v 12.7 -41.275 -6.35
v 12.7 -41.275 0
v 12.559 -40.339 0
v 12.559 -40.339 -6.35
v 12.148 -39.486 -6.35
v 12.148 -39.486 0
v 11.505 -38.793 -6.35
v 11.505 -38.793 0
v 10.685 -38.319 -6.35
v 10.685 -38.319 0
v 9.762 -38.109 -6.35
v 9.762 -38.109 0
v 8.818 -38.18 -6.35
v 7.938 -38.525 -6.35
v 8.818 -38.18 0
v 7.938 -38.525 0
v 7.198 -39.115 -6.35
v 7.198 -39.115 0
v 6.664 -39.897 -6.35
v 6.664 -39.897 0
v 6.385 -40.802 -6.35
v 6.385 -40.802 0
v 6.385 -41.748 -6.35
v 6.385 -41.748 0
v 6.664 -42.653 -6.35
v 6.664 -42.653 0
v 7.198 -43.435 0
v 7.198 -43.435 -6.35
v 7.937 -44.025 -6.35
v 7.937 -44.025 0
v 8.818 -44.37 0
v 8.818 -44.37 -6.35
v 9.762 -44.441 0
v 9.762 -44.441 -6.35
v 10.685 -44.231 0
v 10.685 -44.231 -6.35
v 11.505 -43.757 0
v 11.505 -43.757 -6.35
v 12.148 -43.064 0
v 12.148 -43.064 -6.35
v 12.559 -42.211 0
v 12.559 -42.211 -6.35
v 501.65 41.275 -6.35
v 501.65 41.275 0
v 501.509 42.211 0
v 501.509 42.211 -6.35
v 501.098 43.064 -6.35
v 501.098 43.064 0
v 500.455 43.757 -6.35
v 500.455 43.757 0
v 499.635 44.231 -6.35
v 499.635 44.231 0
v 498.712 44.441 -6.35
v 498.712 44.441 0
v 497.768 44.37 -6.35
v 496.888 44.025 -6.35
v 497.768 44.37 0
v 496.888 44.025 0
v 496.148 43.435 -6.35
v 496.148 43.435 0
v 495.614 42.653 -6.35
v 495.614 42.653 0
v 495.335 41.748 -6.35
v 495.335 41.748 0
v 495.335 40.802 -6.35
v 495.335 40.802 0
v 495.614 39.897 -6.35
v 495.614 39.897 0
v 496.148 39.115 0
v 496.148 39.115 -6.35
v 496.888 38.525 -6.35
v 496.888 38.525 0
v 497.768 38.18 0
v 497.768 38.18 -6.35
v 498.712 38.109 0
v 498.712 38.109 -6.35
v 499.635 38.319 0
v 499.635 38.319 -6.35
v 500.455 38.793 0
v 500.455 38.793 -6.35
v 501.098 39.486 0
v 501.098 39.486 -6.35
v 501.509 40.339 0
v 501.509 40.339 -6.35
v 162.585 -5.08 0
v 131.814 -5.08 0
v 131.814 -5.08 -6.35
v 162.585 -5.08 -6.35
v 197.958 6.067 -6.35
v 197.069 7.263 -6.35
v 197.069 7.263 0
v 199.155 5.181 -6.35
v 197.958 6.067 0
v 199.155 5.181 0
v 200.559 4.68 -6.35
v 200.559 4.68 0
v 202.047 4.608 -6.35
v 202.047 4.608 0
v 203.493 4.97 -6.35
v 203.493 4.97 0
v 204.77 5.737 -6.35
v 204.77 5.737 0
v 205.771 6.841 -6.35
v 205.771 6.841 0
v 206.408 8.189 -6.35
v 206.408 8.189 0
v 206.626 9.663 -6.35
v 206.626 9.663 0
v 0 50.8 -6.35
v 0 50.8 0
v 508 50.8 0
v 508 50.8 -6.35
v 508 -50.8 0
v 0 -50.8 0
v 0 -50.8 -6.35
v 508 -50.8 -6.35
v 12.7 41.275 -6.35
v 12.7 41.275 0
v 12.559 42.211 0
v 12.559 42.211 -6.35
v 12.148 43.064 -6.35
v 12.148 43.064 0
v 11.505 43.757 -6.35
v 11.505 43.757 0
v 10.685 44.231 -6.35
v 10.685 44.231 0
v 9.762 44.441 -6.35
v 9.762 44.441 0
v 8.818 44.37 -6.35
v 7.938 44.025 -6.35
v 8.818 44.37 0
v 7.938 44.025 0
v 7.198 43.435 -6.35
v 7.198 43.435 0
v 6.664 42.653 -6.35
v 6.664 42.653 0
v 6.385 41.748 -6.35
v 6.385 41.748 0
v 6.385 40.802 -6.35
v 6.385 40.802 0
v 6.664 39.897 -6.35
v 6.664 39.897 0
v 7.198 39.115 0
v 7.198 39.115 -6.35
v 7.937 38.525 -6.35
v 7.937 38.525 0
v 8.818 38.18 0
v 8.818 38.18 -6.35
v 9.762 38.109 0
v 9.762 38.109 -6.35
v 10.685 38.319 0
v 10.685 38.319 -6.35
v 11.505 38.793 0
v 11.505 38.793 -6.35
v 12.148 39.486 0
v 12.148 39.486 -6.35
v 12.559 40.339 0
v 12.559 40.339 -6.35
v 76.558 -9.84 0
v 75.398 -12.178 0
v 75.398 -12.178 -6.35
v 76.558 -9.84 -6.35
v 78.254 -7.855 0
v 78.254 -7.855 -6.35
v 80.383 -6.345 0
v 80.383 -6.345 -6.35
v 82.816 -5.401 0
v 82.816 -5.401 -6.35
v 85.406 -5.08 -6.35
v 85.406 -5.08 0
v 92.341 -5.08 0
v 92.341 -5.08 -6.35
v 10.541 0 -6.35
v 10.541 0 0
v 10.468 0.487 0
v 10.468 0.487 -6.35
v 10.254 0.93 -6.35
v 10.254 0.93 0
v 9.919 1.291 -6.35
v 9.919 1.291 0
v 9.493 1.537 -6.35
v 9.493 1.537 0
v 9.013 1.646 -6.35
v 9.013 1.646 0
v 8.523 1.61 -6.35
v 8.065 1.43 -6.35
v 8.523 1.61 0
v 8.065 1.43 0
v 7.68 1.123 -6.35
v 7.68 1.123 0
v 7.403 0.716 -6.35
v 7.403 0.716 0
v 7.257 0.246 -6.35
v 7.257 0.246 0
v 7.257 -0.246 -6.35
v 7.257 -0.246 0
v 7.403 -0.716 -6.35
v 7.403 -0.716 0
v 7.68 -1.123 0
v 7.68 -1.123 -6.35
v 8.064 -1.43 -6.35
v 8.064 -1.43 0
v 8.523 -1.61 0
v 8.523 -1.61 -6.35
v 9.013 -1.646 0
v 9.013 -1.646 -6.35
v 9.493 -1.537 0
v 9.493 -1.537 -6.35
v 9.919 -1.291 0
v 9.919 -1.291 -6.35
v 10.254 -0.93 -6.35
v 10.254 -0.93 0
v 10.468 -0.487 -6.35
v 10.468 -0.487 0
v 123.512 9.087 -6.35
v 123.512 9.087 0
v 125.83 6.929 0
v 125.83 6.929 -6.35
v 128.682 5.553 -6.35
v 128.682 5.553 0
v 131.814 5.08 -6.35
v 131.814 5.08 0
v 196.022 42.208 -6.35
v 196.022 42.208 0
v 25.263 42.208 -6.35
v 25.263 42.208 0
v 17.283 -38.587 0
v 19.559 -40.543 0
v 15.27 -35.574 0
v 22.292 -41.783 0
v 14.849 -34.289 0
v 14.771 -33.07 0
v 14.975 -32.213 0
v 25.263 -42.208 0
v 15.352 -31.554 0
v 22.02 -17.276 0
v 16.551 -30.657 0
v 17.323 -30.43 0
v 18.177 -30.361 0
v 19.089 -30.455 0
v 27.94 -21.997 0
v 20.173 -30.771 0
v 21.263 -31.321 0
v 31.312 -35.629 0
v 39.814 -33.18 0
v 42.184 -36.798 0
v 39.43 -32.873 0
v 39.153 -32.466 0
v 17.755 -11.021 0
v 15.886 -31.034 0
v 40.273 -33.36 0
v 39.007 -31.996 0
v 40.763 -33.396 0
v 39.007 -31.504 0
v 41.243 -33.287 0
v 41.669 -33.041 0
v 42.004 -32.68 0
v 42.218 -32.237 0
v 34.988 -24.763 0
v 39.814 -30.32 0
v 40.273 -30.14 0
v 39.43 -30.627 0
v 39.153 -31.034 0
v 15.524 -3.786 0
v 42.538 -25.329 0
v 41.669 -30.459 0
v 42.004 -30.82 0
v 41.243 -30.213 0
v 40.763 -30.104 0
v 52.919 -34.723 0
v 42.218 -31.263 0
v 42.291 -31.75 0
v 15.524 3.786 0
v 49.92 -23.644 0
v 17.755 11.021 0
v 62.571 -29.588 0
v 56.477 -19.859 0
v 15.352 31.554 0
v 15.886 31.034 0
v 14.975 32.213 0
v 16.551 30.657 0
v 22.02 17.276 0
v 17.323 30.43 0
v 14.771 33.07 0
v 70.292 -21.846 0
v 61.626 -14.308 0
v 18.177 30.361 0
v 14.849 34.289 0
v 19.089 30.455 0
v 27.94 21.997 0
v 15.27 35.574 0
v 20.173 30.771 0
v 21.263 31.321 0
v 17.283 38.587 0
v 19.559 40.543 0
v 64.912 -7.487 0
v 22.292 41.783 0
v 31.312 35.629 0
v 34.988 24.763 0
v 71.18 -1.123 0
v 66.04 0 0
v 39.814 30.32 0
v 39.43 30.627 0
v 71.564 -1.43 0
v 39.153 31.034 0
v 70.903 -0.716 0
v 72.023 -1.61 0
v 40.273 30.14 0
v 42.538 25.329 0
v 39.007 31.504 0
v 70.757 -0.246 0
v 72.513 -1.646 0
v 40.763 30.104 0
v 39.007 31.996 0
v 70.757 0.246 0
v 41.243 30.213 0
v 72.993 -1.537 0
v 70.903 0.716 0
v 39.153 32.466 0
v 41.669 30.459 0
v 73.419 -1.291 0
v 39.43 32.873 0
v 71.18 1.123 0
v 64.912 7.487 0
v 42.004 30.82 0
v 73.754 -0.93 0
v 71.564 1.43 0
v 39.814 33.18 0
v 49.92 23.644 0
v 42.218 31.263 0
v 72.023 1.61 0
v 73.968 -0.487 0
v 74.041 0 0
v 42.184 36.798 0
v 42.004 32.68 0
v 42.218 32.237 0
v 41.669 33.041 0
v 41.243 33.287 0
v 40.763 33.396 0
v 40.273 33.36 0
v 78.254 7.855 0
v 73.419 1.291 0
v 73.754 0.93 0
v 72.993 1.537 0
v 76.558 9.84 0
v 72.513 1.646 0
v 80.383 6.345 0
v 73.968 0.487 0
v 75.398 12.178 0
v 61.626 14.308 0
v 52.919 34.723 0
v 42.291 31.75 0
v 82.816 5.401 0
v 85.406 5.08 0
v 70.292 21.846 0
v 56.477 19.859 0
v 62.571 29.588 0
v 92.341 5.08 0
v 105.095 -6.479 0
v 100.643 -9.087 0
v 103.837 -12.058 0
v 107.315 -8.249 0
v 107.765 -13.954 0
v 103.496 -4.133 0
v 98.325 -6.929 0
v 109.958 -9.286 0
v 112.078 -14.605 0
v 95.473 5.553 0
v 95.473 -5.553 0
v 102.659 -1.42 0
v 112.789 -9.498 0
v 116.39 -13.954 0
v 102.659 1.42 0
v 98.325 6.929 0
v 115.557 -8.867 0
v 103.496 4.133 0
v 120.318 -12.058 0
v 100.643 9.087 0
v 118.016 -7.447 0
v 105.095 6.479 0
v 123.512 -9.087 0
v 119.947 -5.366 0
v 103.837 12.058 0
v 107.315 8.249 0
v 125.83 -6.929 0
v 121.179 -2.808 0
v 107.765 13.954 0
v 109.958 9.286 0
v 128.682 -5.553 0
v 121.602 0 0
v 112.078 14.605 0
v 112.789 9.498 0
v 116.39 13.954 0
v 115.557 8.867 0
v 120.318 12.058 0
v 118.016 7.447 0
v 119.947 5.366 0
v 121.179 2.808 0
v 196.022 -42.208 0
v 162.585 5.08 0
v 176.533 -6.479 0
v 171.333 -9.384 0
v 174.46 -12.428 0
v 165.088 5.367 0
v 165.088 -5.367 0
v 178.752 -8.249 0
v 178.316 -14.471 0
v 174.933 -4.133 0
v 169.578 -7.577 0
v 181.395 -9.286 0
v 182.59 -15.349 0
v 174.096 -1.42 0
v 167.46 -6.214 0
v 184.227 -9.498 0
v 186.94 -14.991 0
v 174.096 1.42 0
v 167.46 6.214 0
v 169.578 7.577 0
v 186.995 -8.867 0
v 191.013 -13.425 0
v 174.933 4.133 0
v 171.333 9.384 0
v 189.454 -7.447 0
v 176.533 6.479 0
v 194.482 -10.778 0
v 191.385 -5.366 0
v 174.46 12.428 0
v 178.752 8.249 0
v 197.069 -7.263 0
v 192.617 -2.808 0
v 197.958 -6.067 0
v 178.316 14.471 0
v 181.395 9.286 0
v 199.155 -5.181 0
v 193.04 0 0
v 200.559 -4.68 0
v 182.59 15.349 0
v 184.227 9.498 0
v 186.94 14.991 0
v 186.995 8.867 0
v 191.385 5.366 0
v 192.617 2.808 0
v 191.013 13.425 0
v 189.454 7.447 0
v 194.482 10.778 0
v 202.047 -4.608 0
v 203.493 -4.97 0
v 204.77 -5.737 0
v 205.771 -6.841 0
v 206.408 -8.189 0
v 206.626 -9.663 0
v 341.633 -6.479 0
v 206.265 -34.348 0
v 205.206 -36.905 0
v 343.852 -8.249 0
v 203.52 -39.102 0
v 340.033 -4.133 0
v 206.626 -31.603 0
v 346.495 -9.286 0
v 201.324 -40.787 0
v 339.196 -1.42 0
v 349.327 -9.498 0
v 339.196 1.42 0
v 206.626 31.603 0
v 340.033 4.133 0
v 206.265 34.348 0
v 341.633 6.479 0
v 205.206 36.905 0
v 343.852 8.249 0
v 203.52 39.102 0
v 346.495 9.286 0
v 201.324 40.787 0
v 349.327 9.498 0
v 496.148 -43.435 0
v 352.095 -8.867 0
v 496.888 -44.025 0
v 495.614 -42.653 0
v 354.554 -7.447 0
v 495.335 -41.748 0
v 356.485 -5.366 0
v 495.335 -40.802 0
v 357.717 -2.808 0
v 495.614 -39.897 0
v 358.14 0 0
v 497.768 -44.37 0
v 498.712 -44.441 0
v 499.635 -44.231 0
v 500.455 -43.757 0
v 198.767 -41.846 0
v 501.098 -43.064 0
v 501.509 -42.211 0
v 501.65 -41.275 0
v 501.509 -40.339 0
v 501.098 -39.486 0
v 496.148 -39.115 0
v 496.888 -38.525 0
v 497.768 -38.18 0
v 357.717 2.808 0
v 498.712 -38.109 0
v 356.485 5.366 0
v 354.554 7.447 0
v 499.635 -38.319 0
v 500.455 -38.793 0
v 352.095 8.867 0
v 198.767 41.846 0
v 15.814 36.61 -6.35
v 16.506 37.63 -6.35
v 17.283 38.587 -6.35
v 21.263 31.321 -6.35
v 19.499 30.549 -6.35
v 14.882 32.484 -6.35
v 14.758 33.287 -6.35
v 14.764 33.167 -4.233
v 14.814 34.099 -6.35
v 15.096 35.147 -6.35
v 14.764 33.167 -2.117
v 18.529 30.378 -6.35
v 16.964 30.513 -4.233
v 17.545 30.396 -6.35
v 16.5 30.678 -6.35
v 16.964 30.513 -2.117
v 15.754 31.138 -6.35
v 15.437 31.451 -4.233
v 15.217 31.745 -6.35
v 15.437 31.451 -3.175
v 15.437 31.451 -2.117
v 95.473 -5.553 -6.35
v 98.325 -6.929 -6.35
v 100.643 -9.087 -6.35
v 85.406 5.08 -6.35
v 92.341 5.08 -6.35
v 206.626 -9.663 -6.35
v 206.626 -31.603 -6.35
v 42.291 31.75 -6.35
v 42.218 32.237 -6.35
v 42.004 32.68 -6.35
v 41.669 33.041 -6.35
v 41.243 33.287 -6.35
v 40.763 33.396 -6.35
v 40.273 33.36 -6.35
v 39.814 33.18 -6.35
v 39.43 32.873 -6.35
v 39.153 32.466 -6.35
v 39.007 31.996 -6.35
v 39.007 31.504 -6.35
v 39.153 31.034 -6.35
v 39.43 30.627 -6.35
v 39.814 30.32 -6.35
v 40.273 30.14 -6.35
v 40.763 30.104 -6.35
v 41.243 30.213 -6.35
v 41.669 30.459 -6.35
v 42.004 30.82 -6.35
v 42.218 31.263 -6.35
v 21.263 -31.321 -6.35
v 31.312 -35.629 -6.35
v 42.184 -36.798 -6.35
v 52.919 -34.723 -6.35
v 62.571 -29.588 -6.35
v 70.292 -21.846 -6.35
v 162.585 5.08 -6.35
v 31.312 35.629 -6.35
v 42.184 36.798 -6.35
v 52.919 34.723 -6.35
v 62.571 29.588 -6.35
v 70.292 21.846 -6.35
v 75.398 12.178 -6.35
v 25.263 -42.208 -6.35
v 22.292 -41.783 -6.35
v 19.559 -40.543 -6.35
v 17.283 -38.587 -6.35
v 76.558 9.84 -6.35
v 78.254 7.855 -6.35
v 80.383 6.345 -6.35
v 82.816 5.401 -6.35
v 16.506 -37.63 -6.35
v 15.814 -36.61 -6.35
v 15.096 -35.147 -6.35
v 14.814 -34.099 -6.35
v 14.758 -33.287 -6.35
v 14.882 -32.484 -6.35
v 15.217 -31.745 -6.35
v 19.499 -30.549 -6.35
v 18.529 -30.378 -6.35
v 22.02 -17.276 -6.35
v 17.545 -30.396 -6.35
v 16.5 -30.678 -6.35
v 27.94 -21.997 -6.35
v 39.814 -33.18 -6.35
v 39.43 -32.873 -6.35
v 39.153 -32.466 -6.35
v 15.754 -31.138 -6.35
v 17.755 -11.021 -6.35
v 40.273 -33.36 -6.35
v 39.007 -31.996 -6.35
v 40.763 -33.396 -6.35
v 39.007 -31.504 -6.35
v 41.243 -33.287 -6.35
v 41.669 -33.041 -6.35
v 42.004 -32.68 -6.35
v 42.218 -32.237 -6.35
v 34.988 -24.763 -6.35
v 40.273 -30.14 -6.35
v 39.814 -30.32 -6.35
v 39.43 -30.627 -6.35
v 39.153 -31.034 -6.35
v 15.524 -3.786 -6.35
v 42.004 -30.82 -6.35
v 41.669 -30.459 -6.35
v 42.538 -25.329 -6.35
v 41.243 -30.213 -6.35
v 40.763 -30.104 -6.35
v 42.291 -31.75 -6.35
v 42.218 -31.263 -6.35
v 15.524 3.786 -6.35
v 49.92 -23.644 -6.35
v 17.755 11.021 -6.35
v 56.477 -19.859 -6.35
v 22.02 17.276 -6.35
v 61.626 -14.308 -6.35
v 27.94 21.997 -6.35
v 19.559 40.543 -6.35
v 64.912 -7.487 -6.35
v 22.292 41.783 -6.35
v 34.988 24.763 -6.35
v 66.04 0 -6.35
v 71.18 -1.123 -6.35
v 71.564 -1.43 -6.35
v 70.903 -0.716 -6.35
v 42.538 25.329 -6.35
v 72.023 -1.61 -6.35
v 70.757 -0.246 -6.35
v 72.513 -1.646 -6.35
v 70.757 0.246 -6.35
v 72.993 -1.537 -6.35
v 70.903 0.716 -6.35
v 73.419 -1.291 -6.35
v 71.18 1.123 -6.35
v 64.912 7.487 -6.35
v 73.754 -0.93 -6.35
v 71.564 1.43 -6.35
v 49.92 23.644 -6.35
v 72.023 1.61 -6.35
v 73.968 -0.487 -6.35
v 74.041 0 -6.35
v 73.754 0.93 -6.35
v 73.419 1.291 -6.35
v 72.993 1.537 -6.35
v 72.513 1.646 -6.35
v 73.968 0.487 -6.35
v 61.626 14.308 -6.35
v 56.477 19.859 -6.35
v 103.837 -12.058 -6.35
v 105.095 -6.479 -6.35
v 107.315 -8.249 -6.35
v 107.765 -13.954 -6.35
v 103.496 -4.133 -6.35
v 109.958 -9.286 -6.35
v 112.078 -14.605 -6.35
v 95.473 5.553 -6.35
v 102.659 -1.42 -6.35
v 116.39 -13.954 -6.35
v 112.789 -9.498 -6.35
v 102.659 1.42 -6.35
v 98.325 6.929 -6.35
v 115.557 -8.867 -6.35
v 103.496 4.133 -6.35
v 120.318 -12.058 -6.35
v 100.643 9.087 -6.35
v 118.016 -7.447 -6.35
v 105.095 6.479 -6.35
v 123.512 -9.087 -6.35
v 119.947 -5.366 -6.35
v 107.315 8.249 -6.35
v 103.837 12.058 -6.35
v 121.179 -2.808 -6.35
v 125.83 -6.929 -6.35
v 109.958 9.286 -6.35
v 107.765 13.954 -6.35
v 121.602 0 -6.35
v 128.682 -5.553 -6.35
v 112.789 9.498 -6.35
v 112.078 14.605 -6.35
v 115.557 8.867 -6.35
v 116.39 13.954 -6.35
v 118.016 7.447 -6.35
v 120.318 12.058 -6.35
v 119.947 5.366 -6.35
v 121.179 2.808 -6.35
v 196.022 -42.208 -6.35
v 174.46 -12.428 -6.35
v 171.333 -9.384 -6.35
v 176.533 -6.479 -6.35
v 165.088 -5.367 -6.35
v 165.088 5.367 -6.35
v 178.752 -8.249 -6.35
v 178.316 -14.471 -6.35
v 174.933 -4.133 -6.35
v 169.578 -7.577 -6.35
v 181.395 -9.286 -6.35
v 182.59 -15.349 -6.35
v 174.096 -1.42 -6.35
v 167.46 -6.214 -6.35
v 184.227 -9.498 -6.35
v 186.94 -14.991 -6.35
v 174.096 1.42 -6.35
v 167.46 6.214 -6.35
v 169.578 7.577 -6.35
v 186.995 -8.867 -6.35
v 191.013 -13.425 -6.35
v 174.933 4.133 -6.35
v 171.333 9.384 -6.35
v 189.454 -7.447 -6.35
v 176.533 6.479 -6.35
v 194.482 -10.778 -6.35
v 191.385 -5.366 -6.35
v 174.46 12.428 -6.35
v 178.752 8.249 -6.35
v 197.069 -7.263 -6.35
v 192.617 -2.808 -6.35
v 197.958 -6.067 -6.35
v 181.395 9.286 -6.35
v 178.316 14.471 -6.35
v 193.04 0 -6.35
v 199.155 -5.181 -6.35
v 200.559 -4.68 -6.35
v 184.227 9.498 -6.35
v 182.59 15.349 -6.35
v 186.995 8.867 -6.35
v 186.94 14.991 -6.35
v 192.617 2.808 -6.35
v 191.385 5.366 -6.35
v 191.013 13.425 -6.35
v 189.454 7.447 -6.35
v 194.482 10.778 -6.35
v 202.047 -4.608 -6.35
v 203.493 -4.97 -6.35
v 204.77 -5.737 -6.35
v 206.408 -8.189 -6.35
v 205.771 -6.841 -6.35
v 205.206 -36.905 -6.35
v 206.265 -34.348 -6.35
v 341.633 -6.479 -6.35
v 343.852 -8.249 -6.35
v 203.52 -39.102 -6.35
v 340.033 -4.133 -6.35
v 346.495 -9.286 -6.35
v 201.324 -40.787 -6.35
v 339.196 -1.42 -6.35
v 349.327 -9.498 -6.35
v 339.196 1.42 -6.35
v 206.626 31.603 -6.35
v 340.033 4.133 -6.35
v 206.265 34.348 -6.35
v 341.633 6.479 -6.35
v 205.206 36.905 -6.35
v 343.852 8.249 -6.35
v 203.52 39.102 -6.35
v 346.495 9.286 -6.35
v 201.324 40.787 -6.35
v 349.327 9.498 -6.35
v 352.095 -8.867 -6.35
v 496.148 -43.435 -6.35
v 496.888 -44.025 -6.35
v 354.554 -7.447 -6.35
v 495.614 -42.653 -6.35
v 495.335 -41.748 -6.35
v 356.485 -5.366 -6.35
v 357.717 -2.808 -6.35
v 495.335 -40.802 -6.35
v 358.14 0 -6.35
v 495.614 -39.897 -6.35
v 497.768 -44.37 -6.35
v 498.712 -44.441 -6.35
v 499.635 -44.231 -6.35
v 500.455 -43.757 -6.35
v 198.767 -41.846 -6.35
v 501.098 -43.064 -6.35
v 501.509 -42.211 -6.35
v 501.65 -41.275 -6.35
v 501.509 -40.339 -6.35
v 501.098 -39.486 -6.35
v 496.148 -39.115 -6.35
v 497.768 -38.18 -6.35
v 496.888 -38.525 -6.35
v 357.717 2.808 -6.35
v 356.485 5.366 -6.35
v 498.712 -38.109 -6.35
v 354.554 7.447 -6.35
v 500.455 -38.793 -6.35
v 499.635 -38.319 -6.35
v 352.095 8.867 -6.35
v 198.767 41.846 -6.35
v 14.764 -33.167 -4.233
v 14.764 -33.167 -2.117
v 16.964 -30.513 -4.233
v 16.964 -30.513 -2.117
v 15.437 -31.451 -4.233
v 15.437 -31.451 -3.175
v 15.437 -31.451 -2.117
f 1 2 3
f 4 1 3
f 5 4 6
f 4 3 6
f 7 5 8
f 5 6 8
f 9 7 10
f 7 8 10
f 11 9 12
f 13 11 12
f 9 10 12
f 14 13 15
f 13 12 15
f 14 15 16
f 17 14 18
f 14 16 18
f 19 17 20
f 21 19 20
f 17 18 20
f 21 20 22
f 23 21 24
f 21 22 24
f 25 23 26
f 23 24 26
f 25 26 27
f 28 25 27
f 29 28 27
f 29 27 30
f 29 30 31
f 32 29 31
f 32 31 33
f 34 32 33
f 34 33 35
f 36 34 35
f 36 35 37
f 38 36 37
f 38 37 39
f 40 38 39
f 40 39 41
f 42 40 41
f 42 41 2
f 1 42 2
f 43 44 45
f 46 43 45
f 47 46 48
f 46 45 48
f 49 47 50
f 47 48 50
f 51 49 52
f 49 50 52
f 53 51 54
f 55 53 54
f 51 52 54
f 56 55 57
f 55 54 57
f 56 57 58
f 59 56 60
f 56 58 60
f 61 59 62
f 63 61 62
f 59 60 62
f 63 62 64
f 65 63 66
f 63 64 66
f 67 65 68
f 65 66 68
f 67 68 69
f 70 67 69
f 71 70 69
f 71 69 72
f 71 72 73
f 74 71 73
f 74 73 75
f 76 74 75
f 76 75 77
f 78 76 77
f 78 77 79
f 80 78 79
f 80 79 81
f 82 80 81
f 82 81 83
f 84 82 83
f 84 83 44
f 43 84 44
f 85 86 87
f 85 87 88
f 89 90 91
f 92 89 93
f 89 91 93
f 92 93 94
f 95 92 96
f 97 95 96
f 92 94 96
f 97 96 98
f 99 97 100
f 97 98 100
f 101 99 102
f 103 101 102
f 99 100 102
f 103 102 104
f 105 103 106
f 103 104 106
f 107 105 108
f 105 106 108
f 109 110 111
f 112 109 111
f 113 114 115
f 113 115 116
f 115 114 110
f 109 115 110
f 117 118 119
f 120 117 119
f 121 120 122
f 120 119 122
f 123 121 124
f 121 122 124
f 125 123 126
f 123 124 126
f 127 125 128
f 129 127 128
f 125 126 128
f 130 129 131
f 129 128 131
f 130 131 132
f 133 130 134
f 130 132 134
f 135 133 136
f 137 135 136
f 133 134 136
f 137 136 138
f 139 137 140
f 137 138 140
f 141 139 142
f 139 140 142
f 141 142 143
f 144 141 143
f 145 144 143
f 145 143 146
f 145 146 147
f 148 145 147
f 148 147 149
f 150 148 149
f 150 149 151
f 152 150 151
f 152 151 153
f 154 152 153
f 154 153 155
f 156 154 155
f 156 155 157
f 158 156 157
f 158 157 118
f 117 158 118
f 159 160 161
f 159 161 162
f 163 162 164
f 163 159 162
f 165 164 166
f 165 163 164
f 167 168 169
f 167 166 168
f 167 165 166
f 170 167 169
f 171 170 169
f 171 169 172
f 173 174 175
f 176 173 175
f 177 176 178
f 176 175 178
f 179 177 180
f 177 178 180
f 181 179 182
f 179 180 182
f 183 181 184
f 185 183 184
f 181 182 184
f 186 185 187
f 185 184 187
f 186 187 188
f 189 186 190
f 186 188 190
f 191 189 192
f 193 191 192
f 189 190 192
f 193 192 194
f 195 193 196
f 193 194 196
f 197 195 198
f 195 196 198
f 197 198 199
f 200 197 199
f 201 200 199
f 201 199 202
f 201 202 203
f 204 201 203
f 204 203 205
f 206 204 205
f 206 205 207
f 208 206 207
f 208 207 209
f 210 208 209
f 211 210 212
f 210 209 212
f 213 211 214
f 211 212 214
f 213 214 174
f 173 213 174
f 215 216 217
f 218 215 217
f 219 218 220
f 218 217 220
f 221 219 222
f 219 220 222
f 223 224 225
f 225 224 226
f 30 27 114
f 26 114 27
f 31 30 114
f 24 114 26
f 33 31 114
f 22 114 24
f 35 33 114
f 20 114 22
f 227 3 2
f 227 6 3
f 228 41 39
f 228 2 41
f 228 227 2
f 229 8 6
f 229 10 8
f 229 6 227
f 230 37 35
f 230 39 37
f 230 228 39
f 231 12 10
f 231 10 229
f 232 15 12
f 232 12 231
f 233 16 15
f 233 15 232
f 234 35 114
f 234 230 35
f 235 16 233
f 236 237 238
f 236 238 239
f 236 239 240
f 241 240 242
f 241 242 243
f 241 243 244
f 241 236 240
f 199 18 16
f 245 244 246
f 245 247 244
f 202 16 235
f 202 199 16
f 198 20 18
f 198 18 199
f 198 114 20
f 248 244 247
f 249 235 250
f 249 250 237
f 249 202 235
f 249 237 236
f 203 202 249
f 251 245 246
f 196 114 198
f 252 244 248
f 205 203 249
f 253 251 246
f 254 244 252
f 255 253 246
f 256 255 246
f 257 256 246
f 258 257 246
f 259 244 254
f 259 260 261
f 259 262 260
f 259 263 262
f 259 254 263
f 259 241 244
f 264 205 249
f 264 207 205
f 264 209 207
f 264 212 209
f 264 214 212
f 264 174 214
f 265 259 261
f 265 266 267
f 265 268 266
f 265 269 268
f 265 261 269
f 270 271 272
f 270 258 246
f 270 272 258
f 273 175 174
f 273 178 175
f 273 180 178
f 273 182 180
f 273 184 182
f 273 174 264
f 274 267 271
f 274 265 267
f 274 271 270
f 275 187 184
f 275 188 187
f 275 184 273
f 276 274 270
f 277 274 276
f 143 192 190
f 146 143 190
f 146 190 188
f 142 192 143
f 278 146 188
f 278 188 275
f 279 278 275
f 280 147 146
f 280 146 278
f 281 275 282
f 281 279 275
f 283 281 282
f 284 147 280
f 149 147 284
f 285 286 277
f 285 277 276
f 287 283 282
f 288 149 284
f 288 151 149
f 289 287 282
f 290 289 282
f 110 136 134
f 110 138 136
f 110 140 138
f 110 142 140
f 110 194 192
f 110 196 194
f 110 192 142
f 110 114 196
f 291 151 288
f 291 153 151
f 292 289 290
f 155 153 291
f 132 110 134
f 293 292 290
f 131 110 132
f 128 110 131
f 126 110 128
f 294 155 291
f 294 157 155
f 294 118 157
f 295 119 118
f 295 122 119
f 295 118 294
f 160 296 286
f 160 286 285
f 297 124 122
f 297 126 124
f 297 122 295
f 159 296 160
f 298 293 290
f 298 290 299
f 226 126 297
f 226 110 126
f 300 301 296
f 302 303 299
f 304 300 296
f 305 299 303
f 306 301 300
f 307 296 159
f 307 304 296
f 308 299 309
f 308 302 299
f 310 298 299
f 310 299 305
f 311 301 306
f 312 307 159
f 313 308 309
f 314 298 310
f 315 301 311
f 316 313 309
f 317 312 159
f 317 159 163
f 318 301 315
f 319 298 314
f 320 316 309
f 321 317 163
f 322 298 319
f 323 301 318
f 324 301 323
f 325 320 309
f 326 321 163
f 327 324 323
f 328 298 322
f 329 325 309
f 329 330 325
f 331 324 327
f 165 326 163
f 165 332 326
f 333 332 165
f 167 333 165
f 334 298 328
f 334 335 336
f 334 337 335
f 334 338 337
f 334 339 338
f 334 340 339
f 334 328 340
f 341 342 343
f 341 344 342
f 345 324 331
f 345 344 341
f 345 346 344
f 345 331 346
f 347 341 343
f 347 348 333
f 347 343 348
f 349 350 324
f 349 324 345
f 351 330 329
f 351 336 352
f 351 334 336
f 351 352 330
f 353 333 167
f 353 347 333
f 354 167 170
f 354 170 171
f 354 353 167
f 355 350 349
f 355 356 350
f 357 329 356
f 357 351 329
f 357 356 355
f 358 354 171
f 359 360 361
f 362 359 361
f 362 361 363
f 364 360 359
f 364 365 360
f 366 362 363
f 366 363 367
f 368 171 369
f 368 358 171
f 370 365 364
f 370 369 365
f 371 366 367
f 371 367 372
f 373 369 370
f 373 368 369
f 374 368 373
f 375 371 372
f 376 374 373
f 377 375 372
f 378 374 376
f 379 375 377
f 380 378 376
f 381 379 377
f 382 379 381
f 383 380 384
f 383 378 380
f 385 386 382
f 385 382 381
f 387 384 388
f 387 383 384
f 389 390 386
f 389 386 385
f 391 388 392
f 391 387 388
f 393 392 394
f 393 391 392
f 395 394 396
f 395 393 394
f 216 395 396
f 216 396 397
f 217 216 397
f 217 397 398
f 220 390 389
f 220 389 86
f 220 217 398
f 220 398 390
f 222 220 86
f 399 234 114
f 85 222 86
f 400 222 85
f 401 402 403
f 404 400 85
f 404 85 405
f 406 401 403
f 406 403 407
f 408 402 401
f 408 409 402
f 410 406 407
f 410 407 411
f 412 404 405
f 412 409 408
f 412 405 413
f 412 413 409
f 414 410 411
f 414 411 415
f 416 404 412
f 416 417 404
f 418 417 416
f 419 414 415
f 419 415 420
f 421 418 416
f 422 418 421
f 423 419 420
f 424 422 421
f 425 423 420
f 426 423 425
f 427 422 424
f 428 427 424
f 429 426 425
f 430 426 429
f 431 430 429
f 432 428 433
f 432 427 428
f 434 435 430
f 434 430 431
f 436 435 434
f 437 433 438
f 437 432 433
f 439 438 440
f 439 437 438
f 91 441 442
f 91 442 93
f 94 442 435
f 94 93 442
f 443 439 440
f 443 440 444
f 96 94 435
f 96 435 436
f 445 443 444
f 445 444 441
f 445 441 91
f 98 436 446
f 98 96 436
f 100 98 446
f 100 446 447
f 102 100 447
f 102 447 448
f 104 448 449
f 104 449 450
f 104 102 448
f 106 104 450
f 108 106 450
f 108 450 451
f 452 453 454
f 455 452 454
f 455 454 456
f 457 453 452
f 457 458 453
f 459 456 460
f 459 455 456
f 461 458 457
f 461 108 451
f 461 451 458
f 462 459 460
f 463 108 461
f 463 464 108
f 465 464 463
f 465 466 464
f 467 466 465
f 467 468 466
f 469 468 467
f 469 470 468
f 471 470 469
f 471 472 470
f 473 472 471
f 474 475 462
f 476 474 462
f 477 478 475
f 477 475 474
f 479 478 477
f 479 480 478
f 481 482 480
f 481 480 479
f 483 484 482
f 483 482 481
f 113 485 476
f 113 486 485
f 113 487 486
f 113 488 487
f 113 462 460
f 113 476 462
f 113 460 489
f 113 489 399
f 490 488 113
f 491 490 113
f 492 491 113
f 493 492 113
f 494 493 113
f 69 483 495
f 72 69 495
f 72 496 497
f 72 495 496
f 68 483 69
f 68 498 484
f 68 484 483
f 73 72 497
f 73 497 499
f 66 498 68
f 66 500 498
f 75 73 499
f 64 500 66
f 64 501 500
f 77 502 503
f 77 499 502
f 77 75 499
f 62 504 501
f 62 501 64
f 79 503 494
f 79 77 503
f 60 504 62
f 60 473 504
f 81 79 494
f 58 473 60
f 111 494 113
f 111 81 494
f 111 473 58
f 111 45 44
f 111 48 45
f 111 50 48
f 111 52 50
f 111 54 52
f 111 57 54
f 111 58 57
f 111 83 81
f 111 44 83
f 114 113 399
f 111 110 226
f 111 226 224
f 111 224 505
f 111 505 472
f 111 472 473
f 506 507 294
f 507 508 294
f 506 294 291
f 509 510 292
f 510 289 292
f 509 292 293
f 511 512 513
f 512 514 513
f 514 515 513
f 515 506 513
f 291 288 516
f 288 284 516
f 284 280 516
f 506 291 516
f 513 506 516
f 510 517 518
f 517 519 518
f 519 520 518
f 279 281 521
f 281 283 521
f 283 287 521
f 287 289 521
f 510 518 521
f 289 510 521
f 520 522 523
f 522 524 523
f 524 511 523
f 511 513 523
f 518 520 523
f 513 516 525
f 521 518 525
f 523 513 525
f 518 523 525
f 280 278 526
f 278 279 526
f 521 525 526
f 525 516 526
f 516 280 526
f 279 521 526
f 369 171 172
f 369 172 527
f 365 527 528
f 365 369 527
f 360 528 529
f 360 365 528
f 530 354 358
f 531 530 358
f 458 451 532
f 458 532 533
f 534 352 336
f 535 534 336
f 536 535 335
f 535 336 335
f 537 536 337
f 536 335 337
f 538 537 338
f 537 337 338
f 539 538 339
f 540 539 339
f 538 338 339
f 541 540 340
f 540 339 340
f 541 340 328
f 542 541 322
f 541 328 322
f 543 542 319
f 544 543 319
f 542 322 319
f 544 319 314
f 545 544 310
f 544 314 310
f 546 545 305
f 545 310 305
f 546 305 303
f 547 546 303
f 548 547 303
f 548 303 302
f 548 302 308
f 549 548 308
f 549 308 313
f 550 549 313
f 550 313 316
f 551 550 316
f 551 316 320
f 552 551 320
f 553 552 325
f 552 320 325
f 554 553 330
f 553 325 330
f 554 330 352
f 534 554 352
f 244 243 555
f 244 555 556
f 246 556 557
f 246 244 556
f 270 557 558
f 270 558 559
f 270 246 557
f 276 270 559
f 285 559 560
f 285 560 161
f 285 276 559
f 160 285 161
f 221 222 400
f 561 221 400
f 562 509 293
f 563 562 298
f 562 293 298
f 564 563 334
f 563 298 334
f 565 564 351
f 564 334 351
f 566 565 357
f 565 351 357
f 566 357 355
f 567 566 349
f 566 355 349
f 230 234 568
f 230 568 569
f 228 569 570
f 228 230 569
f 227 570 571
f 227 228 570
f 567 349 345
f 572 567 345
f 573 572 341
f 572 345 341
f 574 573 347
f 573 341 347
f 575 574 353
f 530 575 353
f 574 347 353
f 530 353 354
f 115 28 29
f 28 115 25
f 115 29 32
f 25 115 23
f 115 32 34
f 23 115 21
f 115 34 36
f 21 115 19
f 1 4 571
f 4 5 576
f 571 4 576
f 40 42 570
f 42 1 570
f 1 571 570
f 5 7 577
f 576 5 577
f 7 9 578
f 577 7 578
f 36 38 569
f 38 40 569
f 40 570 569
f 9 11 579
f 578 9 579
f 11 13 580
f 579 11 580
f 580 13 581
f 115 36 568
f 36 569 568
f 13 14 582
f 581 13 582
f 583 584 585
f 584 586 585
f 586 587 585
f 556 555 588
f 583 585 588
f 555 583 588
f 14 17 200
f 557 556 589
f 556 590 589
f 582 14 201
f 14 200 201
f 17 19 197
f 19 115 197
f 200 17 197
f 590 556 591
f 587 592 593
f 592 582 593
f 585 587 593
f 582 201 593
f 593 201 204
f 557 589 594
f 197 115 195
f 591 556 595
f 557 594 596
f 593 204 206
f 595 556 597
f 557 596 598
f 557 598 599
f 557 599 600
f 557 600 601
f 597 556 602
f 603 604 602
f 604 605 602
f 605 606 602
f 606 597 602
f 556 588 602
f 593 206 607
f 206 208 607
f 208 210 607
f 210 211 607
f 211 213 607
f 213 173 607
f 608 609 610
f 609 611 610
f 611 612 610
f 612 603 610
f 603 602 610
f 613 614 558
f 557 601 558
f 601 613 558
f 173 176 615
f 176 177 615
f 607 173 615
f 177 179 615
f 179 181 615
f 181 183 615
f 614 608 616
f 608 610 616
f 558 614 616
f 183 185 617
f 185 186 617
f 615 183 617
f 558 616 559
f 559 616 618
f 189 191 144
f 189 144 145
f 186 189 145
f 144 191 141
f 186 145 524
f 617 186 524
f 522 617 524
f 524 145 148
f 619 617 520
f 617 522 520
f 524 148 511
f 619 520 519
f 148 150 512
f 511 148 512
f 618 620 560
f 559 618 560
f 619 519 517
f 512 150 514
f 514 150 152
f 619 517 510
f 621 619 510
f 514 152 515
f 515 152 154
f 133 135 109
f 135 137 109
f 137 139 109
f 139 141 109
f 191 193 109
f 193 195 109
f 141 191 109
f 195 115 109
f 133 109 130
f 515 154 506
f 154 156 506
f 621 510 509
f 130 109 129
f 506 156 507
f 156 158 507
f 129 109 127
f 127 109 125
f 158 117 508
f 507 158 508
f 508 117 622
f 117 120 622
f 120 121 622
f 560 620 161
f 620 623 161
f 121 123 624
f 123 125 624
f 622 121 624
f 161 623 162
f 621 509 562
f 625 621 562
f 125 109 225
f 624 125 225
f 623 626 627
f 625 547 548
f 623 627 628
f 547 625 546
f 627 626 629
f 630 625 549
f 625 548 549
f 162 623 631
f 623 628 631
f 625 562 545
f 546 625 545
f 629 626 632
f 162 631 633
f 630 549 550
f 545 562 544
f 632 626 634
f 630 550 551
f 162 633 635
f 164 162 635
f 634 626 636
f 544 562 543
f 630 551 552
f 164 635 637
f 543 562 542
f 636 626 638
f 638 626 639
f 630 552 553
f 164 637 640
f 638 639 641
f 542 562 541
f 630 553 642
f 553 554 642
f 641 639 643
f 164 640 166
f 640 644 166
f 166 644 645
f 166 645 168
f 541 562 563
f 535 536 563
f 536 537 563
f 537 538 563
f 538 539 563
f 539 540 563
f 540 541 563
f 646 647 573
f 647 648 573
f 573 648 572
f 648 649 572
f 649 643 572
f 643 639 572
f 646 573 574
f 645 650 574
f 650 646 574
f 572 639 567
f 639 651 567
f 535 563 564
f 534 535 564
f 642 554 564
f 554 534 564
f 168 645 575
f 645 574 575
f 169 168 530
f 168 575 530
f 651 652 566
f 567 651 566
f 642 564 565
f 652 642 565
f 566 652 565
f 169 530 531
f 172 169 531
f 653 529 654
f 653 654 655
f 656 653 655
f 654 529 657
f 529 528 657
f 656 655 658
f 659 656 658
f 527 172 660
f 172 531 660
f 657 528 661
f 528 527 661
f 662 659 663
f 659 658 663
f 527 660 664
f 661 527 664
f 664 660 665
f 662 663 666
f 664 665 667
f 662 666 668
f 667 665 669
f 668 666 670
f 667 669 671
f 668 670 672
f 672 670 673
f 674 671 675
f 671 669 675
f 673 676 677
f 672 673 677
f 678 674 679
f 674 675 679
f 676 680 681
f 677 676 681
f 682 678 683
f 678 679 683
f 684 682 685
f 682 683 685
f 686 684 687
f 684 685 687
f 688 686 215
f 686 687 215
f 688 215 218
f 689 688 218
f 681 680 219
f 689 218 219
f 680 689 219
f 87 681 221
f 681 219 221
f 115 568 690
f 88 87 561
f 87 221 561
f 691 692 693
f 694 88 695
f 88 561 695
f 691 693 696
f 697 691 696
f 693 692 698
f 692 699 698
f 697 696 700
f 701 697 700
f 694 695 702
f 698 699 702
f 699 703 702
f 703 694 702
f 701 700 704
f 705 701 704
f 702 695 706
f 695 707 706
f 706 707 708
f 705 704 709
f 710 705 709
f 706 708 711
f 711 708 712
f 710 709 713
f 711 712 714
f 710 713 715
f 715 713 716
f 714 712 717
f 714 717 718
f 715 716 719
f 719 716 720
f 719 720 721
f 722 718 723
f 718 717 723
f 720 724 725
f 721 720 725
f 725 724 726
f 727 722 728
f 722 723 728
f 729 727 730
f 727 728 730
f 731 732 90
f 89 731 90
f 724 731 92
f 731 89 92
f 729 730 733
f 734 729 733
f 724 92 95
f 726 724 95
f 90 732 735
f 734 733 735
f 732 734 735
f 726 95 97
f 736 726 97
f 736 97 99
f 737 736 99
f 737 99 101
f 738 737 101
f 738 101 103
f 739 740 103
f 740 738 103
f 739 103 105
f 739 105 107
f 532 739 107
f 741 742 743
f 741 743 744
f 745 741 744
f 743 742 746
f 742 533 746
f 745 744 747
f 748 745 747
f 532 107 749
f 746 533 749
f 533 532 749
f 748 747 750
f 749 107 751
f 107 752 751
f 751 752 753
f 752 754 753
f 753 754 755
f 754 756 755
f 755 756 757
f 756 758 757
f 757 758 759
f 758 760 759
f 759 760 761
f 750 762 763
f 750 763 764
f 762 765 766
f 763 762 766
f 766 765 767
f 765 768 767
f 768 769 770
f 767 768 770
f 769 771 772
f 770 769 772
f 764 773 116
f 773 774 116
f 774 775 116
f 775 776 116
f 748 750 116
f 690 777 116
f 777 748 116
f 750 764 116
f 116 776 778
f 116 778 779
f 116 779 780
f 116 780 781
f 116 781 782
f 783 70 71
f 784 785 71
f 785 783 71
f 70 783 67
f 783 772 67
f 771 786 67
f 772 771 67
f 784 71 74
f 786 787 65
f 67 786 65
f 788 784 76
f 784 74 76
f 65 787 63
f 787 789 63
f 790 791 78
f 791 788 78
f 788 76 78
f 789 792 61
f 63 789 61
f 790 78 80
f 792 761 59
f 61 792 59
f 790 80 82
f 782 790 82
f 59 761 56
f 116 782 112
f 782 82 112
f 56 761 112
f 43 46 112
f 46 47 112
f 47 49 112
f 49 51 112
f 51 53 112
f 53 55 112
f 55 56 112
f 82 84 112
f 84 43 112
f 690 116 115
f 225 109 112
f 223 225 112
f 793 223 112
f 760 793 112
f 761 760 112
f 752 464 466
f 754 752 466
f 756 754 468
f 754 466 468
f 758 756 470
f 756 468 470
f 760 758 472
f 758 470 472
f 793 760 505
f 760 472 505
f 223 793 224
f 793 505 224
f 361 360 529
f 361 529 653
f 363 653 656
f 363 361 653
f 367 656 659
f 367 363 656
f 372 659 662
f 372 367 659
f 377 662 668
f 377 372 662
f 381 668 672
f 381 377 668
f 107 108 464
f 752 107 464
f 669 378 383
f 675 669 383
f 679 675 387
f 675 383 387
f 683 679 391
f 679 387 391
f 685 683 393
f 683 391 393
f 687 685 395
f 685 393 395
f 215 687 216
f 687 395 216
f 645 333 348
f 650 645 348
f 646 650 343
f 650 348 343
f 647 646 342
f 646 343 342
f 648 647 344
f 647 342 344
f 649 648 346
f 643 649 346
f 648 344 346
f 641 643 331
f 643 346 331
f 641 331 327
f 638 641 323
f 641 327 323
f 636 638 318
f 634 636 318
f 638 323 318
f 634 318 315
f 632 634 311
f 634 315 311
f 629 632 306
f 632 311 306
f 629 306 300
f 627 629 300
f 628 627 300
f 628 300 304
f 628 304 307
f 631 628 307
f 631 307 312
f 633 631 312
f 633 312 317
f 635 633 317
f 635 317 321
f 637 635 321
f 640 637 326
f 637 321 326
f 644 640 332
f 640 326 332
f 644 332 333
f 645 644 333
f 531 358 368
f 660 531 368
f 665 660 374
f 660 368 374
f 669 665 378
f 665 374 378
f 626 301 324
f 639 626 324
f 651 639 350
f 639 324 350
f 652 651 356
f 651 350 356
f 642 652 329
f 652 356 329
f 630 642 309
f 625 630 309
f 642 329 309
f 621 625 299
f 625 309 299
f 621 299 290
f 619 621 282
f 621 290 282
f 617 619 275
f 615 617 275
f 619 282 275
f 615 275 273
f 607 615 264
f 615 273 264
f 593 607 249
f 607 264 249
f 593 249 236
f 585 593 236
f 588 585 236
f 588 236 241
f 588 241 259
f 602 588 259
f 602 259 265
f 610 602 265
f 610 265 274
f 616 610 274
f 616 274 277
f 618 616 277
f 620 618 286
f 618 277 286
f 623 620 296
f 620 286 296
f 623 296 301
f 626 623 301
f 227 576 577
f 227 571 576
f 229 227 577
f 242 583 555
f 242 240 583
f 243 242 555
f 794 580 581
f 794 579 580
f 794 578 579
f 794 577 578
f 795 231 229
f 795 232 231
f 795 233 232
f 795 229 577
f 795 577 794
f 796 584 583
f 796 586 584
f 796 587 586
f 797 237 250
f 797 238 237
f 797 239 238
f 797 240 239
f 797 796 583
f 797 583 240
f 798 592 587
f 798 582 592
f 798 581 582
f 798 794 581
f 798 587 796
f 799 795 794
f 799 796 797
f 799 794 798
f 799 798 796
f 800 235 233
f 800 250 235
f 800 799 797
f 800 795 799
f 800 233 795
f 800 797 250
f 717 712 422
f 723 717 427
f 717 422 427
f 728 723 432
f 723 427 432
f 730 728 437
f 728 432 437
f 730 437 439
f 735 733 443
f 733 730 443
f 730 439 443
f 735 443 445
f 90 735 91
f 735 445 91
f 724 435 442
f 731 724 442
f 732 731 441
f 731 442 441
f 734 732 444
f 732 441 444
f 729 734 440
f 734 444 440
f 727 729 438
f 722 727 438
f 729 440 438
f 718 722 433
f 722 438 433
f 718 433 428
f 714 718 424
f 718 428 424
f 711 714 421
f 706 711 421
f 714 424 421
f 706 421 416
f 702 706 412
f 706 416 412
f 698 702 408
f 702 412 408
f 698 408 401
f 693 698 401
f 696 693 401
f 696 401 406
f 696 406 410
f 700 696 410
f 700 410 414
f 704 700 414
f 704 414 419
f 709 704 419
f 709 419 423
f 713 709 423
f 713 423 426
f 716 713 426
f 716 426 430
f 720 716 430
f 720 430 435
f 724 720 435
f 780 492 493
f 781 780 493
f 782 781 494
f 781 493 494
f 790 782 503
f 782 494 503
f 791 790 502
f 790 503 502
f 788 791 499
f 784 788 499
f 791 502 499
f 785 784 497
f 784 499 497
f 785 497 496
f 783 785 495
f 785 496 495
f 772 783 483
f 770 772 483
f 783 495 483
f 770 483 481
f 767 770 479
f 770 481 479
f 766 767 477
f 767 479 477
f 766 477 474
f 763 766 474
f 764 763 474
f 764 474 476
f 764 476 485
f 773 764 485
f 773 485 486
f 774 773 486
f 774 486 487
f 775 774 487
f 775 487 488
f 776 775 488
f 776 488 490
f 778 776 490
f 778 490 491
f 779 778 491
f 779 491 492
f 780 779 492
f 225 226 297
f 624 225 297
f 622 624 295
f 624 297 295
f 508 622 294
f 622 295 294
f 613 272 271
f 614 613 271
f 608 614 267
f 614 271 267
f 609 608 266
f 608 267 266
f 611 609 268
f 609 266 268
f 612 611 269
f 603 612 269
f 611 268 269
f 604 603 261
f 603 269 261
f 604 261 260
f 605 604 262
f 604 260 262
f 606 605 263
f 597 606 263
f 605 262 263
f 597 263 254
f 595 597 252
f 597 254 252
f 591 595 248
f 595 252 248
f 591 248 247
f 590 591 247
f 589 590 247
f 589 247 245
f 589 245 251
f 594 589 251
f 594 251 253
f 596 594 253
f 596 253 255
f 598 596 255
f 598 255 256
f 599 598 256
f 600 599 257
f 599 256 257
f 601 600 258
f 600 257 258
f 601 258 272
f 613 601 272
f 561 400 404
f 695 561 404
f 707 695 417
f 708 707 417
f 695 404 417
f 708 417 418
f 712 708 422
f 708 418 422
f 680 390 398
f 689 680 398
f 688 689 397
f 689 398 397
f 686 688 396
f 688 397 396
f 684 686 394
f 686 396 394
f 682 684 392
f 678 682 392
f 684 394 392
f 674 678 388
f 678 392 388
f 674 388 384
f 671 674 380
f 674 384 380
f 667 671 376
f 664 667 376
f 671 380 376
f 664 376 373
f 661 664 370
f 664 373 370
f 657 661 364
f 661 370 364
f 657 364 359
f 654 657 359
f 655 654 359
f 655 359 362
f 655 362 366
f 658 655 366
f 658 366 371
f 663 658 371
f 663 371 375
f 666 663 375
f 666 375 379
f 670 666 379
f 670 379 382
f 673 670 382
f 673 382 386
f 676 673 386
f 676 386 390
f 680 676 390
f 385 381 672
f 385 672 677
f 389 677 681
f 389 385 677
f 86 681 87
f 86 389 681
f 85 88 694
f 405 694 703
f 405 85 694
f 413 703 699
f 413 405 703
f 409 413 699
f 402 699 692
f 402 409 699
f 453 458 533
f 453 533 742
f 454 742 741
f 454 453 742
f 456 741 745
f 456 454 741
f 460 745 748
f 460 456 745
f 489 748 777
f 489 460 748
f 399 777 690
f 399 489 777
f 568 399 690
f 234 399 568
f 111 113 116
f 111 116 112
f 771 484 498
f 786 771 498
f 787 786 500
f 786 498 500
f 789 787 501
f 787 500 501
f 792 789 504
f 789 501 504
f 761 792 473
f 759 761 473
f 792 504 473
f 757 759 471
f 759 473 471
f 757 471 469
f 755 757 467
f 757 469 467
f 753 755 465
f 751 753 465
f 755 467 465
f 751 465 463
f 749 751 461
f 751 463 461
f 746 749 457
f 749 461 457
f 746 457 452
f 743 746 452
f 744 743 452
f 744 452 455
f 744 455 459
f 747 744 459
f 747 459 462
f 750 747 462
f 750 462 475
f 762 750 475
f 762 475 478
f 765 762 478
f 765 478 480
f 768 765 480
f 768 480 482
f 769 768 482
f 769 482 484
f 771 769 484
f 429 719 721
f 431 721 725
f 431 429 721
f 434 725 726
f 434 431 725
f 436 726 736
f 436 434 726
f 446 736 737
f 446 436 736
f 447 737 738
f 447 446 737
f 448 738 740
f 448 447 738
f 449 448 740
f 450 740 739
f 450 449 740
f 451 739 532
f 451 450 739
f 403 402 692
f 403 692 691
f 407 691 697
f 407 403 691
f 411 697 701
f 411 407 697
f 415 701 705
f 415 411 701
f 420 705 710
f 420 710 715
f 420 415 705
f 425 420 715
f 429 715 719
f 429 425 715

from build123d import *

# Parameters (mm, degrees)
SKETCH1_W           = 508
SKETCH1_H           = 101.6
BOSS_EXTRUDE1_DEPTH = 6.35
SKETCH2_R           = 25.4
SKETCH2_R_2         = 1.651
MOTOR_MOUNT_DEPTH   = 6.35
SKETCH3_R           = 9.525
CUT_EXTRUDE2_DEPTH  = 511.573170564
SKETCH4_R           = 3.175
CUT_EXTRUDE3_DEPTH  = 511.573170564
CUT_EXTRUDE4_DEPTH  = 511.573170564


with BuildPart() as part:
    # Sketch1 → Boss-Extrude1 (new body)
    with BuildSketch(Plane.XY):
        with Locations((254, 0)):
            Rectangle(SKETCH1_W, SKETCH1_H)
    extrude(amount=-BOSS_EXTRUDE1_DEPTH)

    # Sketch2 → Motor mount (cut)
    with BuildSketch(Plane.XY):
        with Locations((40.64, 0)):
            Circle(SKETCH2_R)
        with Locations((72.39, 0)):
            Circle(SKETCH2_R_2)
        with Locations((40.64, -31.75)):
            Circle(SKETCH2_R_2)
        with Locations((8.89, 0)):
            Circle(SKETCH2_R_2)
        with Locations((40.64, 31.75)):
            Circle(SKETCH2_R_2)
    extrude(amount=-MOTOR_MOUNT_DEPTH, mode=Mode.SUBTRACT)

    # Sketch3 → Cut-Extrude2 (cut, through all)
    with BuildSketch(Plane.XY):
        with Locations((112.0775, 0)):
            Circle(SKETCH3_R)
        with Locations((183.515, 0)):
            Circle(SKETCH3_R)
        with Locations((348.615, 0)):
            Circle(SKETCH3_R)
    extrude(amount=-CUT_EXTRUDE2_DEPTH, mode=Mode.SUBTRACT)

    # Sketch4 → Cut-Extrude3 (cut, through all)
    with BuildSketch(Plane.XY):
        with Locations((9.525, 41.275)):
            Circle(SKETCH4_R)
        with Locations((9.525, -41.275)):
            Circle(SKETCH4_R)
        with Locations((498.475, 41.275)):
            Circle(SKETCH4_R)
        with Locations((498.475, -41.275)):
            Circle(SKETCH4_R)
    extrude(amount=-CUT_EXTRUDE3_DEPTH, mode=Mode.SUBTRACT)

    # Sketch7 → Cut-Extrude4 (cut, through all)
    with BuildSketch(Plane.XY):
        with BuildLine():
            Line((85.406292789, 5.08), (92.341412089, 5.08))
            ThreePointArc((92.341412089, 5.08), (96.950572969, 6.134064693), (100.643442411, 9.08671294))
            ThreePointArc((100.643442411, 9.08671294), (112.0775, 14.605), (123.511557589, 9.08671294))
            ThreePointArc((123.511557589, 9.08671294), (127.204427031, 6.134064693), (131.813587911, 5.08))
            Line((131.813587911, 5.08), (162.585112959, 5.08))
            ThreePointArc((162.585112959, 5.08), (167.45975122, 6.214203951), (171.333000793, 9.383818205))
            ThreePointArc((171.333000793, 9.383818205), (184.777760897, 15.325227036), (197.068677539, 7.263261936))
            ThreePointArc((197.068677539, 7.263261936), (202.783248212, 4.735656121), (206.626270766, 9.662753319))
            Line((206.626270766, 9.662753319), (206.626270766, 31.603209647))
            ThreePointArc((206.626270766, 31.603209647), (203.520318205, 39.101642443), (196.02188541, 42.207595003))
            Line((196.02188541, 42.207595003), (25.263102588, 42.207595003))
            ThreePointArc((25.263102588, 42.207595003), (20.881723867, 41.260150637), (17.283250038, 38.587115578))
            add(Edge.make_bspline(
                [(17.283250038, 38.587115578), (11.530533455, 32.014027317), (16.787146308, 28.551640426), (21.263438452, 31.320883809)],
                knots=[0, 0, 0, 0, 1, 1, 1, 1], degree=3))
            ThreePointArc((21.263438452, 31.320883809), (52.918543043, 34.722993545), (75.39838363, 12.177999321))
            ThreePointArc((75.39838363, 12.177999321), (79.271558889, 7.034643814), (85.406292789, 5.08))
        make_face()
    cut_extrude4 = extrude(amount=-CUT_EXTRUDE4_DEPTH, mode=Mode.SUBTRACT)

    # Mirror1: Cut-Extrude4 across plane
    add(cut_extrude4.mirror(Plane.ZX), mode=Mode.SUBTRACT)


solid = part.part
